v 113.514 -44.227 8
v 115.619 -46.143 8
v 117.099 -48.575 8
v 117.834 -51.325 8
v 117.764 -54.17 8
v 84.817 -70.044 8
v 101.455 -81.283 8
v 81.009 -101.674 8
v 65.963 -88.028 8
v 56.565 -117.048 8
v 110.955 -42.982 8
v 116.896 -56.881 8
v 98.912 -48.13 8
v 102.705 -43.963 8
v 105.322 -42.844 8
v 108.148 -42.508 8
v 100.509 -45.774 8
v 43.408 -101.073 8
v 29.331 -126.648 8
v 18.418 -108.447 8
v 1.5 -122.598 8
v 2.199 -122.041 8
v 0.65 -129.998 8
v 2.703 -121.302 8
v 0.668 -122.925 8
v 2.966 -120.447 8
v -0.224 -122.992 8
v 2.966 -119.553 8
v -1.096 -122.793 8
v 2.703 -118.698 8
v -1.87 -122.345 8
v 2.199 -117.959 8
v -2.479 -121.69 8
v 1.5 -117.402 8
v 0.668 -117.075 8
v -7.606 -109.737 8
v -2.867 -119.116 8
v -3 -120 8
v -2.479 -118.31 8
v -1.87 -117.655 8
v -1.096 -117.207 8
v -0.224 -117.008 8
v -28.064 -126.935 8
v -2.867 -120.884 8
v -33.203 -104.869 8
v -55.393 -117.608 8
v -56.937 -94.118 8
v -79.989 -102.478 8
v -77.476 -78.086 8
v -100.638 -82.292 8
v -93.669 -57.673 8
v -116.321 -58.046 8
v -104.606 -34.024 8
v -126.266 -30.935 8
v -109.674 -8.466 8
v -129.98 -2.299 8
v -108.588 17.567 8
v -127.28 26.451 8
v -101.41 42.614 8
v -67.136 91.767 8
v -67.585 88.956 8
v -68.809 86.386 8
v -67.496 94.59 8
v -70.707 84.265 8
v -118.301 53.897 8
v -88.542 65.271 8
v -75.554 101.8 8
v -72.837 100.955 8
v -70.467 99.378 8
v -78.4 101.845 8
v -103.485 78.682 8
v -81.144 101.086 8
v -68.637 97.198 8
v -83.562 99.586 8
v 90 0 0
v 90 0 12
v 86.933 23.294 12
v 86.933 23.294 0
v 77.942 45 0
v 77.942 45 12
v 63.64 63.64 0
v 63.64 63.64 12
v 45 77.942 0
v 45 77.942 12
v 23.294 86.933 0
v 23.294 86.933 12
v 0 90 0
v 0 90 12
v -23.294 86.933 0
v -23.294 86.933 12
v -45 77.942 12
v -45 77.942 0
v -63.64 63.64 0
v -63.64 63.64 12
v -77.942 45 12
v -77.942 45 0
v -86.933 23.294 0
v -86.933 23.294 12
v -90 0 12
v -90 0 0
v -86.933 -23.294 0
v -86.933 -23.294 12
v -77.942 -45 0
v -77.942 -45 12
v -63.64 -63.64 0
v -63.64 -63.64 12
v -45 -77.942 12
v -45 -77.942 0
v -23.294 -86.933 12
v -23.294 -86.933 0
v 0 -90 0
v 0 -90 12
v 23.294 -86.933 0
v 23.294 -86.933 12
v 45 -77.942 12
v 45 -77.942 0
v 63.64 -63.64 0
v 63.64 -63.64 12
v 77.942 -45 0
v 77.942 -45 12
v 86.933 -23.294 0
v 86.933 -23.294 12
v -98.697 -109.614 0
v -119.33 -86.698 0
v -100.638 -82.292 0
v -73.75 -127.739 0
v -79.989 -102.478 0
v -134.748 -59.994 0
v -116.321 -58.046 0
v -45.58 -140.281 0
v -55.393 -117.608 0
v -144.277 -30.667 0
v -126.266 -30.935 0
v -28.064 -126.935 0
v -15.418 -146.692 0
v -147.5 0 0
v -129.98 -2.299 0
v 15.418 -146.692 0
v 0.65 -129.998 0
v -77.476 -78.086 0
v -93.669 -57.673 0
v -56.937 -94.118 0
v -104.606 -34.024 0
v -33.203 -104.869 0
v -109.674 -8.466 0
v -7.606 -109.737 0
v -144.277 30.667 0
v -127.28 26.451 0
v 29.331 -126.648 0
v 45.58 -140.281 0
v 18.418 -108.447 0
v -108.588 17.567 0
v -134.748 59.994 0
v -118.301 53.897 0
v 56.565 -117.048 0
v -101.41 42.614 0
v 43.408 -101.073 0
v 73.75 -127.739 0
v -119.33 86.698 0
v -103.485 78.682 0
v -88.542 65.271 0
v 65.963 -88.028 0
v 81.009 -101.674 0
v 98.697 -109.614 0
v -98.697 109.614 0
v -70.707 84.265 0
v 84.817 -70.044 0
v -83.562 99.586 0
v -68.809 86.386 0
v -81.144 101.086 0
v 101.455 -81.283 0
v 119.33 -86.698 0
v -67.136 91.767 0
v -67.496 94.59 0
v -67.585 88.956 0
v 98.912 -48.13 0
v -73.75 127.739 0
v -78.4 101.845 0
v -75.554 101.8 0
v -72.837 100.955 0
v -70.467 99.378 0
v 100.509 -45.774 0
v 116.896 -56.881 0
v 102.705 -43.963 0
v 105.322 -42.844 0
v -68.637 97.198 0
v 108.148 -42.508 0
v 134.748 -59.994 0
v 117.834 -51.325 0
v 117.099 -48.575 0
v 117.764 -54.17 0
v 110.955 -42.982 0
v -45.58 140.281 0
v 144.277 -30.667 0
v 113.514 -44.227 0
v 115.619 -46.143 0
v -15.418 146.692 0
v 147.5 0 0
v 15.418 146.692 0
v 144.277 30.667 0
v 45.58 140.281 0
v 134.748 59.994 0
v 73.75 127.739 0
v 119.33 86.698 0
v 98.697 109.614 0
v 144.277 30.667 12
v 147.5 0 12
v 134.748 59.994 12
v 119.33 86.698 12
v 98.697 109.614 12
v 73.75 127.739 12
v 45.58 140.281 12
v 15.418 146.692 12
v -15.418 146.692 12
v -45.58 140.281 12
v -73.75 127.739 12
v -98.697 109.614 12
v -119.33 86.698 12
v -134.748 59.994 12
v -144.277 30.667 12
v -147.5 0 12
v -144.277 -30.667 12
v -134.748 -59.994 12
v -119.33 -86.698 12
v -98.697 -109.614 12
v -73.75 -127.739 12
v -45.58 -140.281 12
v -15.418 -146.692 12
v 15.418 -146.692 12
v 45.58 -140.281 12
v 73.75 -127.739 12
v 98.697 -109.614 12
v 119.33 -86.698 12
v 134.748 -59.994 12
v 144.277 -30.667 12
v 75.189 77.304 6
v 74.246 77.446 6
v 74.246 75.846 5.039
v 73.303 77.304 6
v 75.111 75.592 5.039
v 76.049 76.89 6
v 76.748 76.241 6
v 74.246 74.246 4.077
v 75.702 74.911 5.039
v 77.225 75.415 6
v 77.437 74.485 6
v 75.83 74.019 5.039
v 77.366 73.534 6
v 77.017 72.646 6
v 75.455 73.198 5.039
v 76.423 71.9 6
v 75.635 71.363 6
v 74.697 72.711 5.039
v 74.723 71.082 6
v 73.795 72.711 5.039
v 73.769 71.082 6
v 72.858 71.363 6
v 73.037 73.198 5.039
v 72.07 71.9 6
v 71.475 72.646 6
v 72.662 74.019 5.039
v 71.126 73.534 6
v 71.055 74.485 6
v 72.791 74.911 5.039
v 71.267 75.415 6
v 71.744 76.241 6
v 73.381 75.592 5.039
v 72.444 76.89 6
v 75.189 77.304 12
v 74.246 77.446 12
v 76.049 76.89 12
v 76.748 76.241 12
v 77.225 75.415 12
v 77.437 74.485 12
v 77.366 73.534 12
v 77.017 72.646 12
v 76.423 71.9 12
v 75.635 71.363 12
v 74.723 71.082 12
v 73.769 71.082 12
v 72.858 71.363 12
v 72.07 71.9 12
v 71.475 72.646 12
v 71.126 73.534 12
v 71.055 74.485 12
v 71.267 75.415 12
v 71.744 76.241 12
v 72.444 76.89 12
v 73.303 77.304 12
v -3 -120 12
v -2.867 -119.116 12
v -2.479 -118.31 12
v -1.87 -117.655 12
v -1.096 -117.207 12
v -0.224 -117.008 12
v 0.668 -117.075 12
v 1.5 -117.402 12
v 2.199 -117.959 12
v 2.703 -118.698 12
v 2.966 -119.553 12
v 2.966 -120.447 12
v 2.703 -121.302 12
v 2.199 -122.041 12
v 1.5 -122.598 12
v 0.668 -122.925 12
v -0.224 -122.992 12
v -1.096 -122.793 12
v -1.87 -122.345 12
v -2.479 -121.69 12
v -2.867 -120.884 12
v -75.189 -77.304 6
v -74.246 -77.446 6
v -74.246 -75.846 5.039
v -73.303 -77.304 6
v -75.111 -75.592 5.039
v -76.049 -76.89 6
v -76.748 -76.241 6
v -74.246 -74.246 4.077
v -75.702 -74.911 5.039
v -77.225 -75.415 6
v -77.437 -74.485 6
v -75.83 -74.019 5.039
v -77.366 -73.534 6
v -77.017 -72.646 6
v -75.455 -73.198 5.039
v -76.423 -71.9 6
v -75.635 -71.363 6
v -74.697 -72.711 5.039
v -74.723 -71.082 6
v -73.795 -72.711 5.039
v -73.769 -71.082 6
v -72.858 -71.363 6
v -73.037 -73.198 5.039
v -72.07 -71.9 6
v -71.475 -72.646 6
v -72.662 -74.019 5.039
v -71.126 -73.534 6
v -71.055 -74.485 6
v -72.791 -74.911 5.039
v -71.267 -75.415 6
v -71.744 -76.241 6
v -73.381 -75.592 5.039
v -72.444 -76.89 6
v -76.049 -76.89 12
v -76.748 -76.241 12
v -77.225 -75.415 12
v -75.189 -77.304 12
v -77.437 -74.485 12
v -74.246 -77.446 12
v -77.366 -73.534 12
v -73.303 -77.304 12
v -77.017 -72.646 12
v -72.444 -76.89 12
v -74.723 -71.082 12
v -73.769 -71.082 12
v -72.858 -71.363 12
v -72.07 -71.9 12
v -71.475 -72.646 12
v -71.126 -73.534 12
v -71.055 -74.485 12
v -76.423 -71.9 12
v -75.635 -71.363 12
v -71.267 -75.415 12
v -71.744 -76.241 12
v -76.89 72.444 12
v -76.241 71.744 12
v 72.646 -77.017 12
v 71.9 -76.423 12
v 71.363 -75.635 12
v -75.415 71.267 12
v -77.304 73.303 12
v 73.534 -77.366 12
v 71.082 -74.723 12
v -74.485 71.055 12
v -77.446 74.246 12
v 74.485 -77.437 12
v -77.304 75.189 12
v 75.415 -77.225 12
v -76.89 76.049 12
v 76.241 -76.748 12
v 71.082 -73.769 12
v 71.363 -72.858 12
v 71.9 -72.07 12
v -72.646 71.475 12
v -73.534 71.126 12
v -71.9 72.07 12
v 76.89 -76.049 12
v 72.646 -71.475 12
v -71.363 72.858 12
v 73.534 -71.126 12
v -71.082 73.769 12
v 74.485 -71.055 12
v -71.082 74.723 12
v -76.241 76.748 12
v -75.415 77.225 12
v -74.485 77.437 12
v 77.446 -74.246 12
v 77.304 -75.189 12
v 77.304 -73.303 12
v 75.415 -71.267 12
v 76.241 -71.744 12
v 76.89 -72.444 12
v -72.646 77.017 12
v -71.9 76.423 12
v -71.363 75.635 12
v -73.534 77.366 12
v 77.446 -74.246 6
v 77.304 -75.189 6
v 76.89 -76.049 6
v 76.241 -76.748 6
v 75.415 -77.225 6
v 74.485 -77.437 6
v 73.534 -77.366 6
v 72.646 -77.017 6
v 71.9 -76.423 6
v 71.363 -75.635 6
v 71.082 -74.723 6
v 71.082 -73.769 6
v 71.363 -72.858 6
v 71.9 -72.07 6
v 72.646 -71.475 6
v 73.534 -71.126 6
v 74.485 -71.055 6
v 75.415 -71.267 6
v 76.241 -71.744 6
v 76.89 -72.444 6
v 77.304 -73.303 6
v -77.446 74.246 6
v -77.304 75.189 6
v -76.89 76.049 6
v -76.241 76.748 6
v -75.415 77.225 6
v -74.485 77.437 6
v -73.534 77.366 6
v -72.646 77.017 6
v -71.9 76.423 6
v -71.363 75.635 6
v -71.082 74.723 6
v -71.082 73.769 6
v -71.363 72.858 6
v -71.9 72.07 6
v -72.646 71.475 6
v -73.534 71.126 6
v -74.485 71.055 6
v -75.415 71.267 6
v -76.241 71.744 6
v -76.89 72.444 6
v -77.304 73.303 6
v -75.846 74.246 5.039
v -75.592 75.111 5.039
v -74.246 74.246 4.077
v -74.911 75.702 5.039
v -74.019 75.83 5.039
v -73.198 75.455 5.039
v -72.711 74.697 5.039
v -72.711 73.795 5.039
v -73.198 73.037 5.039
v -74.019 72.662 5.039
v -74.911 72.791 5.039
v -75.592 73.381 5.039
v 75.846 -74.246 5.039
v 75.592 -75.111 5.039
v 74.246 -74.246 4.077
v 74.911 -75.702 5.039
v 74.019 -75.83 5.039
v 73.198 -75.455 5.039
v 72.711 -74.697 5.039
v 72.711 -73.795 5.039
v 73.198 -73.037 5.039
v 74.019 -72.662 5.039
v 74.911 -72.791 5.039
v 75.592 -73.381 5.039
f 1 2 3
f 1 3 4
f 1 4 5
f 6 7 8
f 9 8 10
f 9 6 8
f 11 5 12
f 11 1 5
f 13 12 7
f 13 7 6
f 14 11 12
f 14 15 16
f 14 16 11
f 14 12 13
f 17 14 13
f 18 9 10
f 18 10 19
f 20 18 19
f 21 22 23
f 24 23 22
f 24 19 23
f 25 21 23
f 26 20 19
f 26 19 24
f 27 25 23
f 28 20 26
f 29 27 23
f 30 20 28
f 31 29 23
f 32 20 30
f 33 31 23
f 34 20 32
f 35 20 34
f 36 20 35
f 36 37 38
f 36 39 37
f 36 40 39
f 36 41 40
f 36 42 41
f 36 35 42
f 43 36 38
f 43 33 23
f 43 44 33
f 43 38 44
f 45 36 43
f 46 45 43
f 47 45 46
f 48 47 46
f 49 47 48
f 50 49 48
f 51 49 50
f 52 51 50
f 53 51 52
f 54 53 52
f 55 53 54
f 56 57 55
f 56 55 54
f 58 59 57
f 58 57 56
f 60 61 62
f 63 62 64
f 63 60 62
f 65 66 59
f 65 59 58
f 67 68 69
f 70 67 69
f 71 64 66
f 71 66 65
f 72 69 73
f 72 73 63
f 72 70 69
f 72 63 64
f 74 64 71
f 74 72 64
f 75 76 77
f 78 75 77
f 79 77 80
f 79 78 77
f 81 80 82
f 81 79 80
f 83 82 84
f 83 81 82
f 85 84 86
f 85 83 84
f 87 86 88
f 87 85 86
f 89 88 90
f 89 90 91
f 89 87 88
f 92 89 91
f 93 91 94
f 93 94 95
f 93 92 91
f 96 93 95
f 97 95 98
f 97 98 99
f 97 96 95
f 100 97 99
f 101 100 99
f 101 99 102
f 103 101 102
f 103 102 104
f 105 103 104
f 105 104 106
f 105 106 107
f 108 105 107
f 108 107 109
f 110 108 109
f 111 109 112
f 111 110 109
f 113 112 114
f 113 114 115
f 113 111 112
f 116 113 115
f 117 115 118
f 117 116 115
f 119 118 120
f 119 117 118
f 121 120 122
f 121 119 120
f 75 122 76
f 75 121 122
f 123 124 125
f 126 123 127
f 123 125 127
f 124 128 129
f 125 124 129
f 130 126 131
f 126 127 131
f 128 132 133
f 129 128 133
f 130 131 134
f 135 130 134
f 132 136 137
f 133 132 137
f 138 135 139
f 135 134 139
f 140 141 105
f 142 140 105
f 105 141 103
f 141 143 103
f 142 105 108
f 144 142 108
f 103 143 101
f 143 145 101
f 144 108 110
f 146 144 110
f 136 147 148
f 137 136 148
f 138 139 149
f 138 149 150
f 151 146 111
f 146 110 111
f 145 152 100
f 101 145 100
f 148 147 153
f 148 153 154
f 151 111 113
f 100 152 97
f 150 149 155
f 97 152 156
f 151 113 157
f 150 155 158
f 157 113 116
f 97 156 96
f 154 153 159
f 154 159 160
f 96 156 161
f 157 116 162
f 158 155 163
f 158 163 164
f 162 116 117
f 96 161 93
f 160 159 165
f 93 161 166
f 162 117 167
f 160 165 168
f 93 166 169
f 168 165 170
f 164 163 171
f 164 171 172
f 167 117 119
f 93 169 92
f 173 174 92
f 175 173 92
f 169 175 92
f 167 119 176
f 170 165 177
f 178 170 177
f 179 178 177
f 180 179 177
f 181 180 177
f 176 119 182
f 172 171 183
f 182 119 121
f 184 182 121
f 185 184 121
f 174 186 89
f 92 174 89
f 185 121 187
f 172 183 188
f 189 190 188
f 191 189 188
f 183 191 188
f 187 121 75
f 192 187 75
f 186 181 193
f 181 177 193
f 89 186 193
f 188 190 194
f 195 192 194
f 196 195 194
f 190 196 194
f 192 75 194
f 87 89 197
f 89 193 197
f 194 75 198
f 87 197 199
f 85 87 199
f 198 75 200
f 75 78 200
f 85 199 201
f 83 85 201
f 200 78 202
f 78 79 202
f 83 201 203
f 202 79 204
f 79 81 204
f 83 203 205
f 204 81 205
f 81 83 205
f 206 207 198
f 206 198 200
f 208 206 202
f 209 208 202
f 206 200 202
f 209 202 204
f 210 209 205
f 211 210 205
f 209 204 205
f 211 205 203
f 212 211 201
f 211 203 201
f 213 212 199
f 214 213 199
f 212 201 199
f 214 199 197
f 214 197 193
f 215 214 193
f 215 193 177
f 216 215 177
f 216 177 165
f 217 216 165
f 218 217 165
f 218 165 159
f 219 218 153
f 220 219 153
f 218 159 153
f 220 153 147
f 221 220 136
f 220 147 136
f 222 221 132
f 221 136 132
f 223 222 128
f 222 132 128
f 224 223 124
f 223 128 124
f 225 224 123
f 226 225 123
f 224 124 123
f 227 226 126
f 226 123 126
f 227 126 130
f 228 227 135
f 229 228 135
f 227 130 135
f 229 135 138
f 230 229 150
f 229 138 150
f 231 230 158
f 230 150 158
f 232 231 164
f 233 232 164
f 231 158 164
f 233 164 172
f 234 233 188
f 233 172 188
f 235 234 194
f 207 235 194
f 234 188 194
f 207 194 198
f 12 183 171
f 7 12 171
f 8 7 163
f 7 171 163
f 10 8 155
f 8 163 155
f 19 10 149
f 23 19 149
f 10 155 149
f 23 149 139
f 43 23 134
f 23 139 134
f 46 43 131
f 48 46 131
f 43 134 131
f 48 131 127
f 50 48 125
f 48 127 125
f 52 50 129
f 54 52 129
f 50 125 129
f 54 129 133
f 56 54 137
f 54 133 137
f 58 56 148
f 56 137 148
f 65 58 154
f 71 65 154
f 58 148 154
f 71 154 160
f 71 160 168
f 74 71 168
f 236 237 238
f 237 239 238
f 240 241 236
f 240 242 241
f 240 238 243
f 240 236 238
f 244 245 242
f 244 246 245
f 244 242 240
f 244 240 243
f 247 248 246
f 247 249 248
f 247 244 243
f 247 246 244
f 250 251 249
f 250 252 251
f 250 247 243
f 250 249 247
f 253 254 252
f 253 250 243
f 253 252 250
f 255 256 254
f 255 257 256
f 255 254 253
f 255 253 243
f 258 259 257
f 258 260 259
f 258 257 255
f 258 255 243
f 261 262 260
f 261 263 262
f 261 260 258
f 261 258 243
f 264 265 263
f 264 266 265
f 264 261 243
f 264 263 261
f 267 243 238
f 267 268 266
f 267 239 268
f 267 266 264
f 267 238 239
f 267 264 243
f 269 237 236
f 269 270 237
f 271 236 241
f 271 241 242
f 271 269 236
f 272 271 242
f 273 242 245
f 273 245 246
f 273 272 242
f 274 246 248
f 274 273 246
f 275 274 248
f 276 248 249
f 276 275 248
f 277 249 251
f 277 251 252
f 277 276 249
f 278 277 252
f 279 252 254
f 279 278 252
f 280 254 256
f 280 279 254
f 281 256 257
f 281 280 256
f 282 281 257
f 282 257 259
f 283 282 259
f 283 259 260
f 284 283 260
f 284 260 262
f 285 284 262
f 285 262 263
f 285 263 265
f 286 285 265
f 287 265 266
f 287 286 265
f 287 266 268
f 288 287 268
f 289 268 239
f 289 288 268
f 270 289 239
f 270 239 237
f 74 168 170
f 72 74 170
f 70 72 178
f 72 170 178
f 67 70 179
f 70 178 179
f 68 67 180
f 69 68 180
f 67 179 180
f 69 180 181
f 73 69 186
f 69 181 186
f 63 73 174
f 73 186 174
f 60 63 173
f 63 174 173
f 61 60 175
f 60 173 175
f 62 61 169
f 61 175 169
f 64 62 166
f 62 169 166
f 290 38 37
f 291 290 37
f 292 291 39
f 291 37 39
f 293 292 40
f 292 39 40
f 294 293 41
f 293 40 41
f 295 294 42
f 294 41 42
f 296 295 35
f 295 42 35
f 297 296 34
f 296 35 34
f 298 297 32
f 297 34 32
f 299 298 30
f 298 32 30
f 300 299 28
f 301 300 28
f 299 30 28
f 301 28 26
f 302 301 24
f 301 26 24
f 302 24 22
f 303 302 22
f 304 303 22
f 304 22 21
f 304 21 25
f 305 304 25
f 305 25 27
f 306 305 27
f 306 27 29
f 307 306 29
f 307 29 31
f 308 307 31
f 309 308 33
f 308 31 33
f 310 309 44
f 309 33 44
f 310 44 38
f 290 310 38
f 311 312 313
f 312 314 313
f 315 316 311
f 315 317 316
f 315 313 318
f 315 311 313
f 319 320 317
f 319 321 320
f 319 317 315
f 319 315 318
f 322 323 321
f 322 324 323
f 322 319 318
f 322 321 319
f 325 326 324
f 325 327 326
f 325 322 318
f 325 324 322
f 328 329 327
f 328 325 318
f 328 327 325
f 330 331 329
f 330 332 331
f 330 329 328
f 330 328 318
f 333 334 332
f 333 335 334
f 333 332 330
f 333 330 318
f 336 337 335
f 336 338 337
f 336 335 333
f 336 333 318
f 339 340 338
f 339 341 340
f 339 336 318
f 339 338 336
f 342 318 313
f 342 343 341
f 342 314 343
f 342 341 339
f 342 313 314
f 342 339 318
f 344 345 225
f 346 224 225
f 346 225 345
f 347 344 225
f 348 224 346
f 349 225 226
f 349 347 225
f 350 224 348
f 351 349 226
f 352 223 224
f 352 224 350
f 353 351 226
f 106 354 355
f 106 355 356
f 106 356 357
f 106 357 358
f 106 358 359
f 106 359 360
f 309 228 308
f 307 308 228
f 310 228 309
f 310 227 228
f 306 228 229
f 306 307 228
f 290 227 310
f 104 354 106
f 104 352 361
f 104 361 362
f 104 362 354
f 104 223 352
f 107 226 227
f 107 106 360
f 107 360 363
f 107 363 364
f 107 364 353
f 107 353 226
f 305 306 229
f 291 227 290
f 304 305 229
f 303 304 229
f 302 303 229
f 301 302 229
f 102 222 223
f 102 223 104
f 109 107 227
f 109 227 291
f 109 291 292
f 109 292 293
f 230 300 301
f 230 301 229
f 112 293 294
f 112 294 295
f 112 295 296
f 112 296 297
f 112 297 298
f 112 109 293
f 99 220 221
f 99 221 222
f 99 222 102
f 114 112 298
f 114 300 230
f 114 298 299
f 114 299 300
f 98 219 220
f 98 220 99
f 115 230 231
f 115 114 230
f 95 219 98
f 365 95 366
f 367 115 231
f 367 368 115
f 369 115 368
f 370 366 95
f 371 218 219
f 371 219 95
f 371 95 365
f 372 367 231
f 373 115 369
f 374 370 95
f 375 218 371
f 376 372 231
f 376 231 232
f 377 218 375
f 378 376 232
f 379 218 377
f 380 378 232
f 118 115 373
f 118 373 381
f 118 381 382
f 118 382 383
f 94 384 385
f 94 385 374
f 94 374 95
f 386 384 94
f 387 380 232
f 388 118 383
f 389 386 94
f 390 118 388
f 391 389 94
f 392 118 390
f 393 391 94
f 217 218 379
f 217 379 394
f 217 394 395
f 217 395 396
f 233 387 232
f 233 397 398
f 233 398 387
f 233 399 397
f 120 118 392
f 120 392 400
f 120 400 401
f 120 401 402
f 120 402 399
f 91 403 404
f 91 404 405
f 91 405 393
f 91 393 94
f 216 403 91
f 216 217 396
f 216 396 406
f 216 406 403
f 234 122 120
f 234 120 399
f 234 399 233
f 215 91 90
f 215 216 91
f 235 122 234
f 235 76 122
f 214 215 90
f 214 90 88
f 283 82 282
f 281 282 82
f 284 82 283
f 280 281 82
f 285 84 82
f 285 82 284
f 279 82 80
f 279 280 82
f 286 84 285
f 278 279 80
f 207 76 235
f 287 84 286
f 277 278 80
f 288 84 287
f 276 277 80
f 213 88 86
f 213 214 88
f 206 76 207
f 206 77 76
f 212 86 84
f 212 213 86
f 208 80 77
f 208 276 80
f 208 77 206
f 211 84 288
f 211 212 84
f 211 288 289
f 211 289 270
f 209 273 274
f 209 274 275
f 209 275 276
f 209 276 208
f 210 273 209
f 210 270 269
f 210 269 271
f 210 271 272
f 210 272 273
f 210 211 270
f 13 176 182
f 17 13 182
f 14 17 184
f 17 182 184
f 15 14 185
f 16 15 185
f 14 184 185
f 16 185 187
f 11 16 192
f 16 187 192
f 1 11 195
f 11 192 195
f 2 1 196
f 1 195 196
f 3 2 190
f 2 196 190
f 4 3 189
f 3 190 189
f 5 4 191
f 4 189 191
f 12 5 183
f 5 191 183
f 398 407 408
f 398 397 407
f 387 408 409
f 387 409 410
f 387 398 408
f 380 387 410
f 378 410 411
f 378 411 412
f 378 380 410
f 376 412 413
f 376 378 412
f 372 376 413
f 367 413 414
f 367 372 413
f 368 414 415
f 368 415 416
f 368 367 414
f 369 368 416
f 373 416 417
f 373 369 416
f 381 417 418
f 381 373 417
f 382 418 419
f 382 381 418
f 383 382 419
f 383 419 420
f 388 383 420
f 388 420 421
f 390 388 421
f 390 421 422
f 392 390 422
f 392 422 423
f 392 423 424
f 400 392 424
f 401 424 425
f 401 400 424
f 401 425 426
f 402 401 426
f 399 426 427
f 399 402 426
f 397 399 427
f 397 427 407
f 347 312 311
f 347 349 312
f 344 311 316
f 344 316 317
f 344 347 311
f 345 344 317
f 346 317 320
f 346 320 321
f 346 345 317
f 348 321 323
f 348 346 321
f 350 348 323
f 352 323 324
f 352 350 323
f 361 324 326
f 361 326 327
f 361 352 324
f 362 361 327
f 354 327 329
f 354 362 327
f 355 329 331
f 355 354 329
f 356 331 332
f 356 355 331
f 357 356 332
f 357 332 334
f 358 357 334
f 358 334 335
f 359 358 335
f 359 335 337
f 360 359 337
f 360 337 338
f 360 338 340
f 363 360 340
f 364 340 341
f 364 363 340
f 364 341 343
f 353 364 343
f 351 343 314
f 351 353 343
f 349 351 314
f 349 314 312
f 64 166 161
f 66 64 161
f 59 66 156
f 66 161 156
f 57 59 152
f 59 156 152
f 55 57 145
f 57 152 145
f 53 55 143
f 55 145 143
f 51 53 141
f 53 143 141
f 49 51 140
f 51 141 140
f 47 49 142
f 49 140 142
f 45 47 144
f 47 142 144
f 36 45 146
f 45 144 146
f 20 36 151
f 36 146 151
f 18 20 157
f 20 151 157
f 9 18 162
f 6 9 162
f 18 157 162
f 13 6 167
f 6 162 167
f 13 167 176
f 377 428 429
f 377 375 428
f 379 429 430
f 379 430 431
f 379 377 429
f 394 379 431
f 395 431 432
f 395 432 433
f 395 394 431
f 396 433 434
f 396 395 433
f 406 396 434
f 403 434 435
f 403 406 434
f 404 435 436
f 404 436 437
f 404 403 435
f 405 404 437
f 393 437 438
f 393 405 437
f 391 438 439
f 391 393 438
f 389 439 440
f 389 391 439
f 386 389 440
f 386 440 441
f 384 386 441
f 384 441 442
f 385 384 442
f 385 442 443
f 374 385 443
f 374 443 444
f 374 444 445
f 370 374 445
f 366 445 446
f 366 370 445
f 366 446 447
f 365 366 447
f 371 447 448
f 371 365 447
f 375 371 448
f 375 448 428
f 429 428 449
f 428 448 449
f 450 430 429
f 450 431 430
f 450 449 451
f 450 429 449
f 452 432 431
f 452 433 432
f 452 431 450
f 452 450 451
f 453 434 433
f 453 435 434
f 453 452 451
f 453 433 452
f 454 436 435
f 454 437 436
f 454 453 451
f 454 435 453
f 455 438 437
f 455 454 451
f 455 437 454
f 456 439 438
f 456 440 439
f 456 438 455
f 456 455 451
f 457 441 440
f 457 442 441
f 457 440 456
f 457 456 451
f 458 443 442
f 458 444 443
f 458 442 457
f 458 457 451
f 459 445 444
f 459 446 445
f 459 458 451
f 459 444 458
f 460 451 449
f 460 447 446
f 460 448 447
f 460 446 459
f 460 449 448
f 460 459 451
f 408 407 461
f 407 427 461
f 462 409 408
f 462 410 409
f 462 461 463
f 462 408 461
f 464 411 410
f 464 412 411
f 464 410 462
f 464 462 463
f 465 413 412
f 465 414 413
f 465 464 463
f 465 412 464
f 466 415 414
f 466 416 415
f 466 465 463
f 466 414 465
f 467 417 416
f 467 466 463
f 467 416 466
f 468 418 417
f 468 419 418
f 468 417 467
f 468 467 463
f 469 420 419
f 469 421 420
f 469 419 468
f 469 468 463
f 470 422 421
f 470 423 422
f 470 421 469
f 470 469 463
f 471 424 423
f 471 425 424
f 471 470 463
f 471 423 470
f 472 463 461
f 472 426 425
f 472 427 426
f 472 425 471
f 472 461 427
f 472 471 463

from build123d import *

# Parameters (mm, degrees)
SCHIZZO1_R                   = 147.5
SCHIZZO1_R_2                 = 90
ESTRUSIONE_ESTRUSIONE1_DEPTH = 12
TAGLIO_ESTRUSIONE1_DEPTH     = 8
SCHIZZO10_R                  = 3
TAGLIO_ESTRUSIONE2_DEPTH     = 4
RIPETIZIONECIRCOLARE3_COUNT  = 4


with BuildPart() as part:
    # Schizzo1 → Estrusione-Estrusione1 (new body)
    with BuildSketch(Plane.XY):
        Circle(SCHIZZO1_R)
        Circle(SCHIZZO1_R_2, mode=Mode.SUBTRACT)
    extrude(amount=ESTRUSIONE_ESTRUSIONE1_DEPTH)

    # Schizzo3 → Taglio-Estrusione1 (cut)
    with BuildSketch(Plane(origin=(0, 0, 0), x_dir=(-1, 0, 0), z_dir=(0, 0, -1))):
        with BuildLine():
            ThreePointArc((83.562389259, 99.585777605), (69.474068731, 98.353209271), (70.706637066, 84.264888743))
            ThreePointArc((70.706637066, 84.264888743), (67.682853372, -86.712348368), (-98.91169794, -48.12978299))
            ThreePointArc((-98.91169794, -48.12978299), (-112.279105297, -43.513245268), (-116.89564302, -56.880652625))
            ThreePointArc((-116.89564302, -56.880652625), (79.988826712, -102.478229889), (83.562389259, 99.585777605))
        make_face()
    extrude(amount=-TAGLIO_ESTRUSIONE1_DEPTH, mode=Mode.SUBTRACT)

    # Schizzo10 → Taglio-Estrusione2 (cut)
    with BuildSketch(Plane(origin=(0, 0, 8), x_dir=(-1, 0, 0), z_dir=(0, 0, -1))):
        with Locations((0, -120)):
            Circle(SCHIZZO10_R)
    extrude(amount=-TAGLIO_ESTRUSIONE2_DEPTH, mode=Mode.SUBTRACT)

    # Schizzo13 → Foro per Vite M6-1 (revolve, cut)
    with BuildSketch(Plane(origin=(-74.246212025, -74.246212025, 12), x_dir=(0, -1, 0), z_dir=(1, 0, 0))):
        Polygon((0, 0), (0, 7.922753981), (3.2, 6), (3.2, 0), align=None)
    foro_per_vite_m6_1 = revolve(axis=Axis((-74.246212025, -74.246212025, 18.35), (0, 0, -1)), mode=Mode.SUBTRACT)

    # RipetizioneCircolare3: Foro per Vite M6-1 ×4 about axis
    ripetizionecircolare3_axis = Axis((0, 0, 0), (0, 0, 1))
    for i in range(1, RIPETIZIONECIRCOLARE3_COUNT):
        add(foro_per_vite_m6_1.rotate(ripetizionecircolare3_axis, i * 360 / RIPETIZIONECIRCOLARE3_COUNT), mode=Mode.SUBTRACT)


solid = part.part
